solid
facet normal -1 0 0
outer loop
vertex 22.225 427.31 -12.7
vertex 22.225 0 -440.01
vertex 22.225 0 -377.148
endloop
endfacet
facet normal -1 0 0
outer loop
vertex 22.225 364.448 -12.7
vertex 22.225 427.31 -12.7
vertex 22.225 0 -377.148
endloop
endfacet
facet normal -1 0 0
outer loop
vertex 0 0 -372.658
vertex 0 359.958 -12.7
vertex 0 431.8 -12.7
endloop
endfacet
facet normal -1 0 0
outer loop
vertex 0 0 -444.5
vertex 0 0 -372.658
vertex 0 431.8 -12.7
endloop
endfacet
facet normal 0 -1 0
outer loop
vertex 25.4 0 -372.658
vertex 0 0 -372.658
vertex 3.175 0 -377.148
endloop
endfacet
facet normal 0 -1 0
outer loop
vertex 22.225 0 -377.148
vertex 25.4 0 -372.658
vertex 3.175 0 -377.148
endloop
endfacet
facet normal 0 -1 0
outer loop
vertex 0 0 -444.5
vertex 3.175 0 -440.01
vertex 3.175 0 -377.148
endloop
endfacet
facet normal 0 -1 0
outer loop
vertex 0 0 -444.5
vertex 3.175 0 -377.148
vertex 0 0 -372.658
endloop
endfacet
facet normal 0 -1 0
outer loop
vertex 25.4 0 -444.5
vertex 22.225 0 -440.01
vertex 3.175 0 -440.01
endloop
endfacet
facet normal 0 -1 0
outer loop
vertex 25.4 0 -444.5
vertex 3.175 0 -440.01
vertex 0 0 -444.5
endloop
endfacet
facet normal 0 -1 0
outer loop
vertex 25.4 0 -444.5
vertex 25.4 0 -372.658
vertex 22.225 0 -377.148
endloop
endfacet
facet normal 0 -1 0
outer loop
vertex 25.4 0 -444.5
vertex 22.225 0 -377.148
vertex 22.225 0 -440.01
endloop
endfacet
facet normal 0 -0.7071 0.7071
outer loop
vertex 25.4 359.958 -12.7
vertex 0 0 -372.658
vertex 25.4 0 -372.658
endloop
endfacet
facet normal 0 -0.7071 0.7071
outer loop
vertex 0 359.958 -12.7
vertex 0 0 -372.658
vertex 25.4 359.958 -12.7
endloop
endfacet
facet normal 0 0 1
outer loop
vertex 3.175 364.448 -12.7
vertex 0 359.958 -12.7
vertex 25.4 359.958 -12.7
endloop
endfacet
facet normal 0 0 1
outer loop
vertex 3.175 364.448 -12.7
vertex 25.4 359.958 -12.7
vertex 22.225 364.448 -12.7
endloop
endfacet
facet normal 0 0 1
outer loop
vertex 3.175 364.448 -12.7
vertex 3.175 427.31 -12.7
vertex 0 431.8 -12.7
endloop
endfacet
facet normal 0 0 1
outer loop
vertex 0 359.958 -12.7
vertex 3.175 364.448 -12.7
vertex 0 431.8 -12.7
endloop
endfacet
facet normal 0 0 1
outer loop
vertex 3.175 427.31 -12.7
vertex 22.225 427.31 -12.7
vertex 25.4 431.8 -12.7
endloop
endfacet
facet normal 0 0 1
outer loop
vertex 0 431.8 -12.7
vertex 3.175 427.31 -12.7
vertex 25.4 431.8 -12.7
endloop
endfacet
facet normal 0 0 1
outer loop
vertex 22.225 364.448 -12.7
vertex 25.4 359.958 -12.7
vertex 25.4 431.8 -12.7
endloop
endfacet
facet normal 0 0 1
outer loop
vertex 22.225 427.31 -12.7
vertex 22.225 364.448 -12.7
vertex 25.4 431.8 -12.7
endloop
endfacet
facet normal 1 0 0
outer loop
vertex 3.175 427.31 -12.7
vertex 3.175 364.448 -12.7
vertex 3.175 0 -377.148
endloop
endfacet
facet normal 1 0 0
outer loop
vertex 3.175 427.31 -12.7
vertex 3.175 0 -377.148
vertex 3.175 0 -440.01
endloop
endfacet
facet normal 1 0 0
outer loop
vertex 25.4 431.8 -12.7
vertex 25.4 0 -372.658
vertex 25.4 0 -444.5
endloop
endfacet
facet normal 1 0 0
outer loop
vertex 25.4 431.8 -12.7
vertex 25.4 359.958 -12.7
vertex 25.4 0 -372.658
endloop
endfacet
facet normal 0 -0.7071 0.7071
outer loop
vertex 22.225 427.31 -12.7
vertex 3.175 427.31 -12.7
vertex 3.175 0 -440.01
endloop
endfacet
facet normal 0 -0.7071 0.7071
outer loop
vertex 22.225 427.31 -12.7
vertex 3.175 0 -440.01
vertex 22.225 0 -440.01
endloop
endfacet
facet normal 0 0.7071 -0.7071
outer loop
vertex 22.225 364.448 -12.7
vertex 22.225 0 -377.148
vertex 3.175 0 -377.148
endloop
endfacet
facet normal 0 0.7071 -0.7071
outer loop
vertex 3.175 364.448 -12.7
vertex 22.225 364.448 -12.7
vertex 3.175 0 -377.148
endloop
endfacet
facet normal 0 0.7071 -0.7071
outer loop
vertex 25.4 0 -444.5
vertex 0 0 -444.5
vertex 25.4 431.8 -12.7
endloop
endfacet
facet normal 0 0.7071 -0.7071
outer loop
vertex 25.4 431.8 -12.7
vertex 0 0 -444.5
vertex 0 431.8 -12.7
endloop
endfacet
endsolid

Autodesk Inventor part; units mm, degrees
ref_plane "YZ Plane" through (0, 0, 0) normal (1, 0, 0) x (0, 1, 0)
ref_plane "XZ Plane" through (0, 0, 0) normal (0, 1, 0) x (-1, 0, 0)
ref_plane "XY Plane" through (0, 0, 0) normal (0, 0, 1) x (1, 0, 0)
sketch "Sketch1" plane through (0, 0, 0) normal (1, 0, 0) x (0, 1, 0)
  line L0 (0, -444.5) -> (444.5, 0)
  line L1 (-35.921, -408.579) -> (408.579, 35.921)
  line L2 (0, -444.5) -> (-35.921, -408.579)
  line L3 (408.579, 35.921) -> (444.5, 0)
  point P0 (0, 0)
  dimension "d1" = 444.5
  dimension "d3" = 50.8
extrude "Extrusion1" add sketch "Sketch1" along normal blind 25.4
sketch "Sketch2" plane through (0, 408.579, 35.921) normal (0, 0.7071, 0.7071) x (1, 0, 0)
  line L0 (0, 50.8) -> (0, 0) projected
  line L1 (0, 0) -> (25.4, 0)
  line L2 (25.4, 0) -> (25.4, 50.8)
  line L3 (25.4, 50.8) -> (0, 50.8)
  line L4 (0, 50.8) -> (0, 0)
  line L5 (3.175, 47.625) -> (22.225, 47.625)
  line L6 (22.225, 47.625) -> (22.225, 3.175)
  line L7 (22.225, 3.175) -> (3.175, 3.175)
  line L8 (3.175, 3.175) -> (3.175, 47.625)
  point P0 (0, -263.509)
  dimension "d6" = 3.175
extrude "Extrusion2" cut sketch "Sketch2" against normal blind 762 contours L5 L6 L7 L8
sketch "Sketch3" plane through (25.4, 0, 0) normal (1, 0, 0) x (0, 0, -1)
  line L0 (444.5, 0) -> (0, 444.5) projected
  line L1 (0, 444.5) -> (0, 339.9202)
  line L2 (0, 339.9202) -> (302.3662, 0)
  line L3 (302.3662, 0) -> (653.5481, 0)
  line L4 (653.5481, 0) -> (477.9571, -156.1918)
  line L5 (477.9571, -156.1918) -> (43.0071, -156.1918)
  line L6 (43.0071, -156.1918) -> (-176.0789, 222.25)
  line L7 (-176.0789, 222.25) -> (-134.1948, 471.4919)
  line L8 (-134.1948, 471.4919) -> (0, 494.0448)
  line L9 (0, 494.0448) -> (0, 444.5)
  point P0 (0, 0)
extrude "Extrusion3" cut sketch "Sketch3" against normal blind 25.4 contours L3 L4 L5 L6 L7 L8 L9 L1 L2
sketch "Sketch4" plane through (25.4, 0, 0) normal (1, 0, 0) x (0, 0, -1)
  line L0 (0, 0) -> (12.7, 0)
  line L1 (12.7, 0) -> (12.7, 805.7013)
  line L2 (12.7, 805.7013) -> (-196.8353, 855.7921)
  line L3 (-196.8353, 855.7921) -> (-242.5704, 324.3941)
  line L4 (-242.5704, 324.3941) -> (0, 0)
  dimension "d11" = 12.7
extrude "Extrusion4" cut sketch "Sketch4" against normal blind 25.4
properties part number "liftanglebar" material "Aluminum 6061"
